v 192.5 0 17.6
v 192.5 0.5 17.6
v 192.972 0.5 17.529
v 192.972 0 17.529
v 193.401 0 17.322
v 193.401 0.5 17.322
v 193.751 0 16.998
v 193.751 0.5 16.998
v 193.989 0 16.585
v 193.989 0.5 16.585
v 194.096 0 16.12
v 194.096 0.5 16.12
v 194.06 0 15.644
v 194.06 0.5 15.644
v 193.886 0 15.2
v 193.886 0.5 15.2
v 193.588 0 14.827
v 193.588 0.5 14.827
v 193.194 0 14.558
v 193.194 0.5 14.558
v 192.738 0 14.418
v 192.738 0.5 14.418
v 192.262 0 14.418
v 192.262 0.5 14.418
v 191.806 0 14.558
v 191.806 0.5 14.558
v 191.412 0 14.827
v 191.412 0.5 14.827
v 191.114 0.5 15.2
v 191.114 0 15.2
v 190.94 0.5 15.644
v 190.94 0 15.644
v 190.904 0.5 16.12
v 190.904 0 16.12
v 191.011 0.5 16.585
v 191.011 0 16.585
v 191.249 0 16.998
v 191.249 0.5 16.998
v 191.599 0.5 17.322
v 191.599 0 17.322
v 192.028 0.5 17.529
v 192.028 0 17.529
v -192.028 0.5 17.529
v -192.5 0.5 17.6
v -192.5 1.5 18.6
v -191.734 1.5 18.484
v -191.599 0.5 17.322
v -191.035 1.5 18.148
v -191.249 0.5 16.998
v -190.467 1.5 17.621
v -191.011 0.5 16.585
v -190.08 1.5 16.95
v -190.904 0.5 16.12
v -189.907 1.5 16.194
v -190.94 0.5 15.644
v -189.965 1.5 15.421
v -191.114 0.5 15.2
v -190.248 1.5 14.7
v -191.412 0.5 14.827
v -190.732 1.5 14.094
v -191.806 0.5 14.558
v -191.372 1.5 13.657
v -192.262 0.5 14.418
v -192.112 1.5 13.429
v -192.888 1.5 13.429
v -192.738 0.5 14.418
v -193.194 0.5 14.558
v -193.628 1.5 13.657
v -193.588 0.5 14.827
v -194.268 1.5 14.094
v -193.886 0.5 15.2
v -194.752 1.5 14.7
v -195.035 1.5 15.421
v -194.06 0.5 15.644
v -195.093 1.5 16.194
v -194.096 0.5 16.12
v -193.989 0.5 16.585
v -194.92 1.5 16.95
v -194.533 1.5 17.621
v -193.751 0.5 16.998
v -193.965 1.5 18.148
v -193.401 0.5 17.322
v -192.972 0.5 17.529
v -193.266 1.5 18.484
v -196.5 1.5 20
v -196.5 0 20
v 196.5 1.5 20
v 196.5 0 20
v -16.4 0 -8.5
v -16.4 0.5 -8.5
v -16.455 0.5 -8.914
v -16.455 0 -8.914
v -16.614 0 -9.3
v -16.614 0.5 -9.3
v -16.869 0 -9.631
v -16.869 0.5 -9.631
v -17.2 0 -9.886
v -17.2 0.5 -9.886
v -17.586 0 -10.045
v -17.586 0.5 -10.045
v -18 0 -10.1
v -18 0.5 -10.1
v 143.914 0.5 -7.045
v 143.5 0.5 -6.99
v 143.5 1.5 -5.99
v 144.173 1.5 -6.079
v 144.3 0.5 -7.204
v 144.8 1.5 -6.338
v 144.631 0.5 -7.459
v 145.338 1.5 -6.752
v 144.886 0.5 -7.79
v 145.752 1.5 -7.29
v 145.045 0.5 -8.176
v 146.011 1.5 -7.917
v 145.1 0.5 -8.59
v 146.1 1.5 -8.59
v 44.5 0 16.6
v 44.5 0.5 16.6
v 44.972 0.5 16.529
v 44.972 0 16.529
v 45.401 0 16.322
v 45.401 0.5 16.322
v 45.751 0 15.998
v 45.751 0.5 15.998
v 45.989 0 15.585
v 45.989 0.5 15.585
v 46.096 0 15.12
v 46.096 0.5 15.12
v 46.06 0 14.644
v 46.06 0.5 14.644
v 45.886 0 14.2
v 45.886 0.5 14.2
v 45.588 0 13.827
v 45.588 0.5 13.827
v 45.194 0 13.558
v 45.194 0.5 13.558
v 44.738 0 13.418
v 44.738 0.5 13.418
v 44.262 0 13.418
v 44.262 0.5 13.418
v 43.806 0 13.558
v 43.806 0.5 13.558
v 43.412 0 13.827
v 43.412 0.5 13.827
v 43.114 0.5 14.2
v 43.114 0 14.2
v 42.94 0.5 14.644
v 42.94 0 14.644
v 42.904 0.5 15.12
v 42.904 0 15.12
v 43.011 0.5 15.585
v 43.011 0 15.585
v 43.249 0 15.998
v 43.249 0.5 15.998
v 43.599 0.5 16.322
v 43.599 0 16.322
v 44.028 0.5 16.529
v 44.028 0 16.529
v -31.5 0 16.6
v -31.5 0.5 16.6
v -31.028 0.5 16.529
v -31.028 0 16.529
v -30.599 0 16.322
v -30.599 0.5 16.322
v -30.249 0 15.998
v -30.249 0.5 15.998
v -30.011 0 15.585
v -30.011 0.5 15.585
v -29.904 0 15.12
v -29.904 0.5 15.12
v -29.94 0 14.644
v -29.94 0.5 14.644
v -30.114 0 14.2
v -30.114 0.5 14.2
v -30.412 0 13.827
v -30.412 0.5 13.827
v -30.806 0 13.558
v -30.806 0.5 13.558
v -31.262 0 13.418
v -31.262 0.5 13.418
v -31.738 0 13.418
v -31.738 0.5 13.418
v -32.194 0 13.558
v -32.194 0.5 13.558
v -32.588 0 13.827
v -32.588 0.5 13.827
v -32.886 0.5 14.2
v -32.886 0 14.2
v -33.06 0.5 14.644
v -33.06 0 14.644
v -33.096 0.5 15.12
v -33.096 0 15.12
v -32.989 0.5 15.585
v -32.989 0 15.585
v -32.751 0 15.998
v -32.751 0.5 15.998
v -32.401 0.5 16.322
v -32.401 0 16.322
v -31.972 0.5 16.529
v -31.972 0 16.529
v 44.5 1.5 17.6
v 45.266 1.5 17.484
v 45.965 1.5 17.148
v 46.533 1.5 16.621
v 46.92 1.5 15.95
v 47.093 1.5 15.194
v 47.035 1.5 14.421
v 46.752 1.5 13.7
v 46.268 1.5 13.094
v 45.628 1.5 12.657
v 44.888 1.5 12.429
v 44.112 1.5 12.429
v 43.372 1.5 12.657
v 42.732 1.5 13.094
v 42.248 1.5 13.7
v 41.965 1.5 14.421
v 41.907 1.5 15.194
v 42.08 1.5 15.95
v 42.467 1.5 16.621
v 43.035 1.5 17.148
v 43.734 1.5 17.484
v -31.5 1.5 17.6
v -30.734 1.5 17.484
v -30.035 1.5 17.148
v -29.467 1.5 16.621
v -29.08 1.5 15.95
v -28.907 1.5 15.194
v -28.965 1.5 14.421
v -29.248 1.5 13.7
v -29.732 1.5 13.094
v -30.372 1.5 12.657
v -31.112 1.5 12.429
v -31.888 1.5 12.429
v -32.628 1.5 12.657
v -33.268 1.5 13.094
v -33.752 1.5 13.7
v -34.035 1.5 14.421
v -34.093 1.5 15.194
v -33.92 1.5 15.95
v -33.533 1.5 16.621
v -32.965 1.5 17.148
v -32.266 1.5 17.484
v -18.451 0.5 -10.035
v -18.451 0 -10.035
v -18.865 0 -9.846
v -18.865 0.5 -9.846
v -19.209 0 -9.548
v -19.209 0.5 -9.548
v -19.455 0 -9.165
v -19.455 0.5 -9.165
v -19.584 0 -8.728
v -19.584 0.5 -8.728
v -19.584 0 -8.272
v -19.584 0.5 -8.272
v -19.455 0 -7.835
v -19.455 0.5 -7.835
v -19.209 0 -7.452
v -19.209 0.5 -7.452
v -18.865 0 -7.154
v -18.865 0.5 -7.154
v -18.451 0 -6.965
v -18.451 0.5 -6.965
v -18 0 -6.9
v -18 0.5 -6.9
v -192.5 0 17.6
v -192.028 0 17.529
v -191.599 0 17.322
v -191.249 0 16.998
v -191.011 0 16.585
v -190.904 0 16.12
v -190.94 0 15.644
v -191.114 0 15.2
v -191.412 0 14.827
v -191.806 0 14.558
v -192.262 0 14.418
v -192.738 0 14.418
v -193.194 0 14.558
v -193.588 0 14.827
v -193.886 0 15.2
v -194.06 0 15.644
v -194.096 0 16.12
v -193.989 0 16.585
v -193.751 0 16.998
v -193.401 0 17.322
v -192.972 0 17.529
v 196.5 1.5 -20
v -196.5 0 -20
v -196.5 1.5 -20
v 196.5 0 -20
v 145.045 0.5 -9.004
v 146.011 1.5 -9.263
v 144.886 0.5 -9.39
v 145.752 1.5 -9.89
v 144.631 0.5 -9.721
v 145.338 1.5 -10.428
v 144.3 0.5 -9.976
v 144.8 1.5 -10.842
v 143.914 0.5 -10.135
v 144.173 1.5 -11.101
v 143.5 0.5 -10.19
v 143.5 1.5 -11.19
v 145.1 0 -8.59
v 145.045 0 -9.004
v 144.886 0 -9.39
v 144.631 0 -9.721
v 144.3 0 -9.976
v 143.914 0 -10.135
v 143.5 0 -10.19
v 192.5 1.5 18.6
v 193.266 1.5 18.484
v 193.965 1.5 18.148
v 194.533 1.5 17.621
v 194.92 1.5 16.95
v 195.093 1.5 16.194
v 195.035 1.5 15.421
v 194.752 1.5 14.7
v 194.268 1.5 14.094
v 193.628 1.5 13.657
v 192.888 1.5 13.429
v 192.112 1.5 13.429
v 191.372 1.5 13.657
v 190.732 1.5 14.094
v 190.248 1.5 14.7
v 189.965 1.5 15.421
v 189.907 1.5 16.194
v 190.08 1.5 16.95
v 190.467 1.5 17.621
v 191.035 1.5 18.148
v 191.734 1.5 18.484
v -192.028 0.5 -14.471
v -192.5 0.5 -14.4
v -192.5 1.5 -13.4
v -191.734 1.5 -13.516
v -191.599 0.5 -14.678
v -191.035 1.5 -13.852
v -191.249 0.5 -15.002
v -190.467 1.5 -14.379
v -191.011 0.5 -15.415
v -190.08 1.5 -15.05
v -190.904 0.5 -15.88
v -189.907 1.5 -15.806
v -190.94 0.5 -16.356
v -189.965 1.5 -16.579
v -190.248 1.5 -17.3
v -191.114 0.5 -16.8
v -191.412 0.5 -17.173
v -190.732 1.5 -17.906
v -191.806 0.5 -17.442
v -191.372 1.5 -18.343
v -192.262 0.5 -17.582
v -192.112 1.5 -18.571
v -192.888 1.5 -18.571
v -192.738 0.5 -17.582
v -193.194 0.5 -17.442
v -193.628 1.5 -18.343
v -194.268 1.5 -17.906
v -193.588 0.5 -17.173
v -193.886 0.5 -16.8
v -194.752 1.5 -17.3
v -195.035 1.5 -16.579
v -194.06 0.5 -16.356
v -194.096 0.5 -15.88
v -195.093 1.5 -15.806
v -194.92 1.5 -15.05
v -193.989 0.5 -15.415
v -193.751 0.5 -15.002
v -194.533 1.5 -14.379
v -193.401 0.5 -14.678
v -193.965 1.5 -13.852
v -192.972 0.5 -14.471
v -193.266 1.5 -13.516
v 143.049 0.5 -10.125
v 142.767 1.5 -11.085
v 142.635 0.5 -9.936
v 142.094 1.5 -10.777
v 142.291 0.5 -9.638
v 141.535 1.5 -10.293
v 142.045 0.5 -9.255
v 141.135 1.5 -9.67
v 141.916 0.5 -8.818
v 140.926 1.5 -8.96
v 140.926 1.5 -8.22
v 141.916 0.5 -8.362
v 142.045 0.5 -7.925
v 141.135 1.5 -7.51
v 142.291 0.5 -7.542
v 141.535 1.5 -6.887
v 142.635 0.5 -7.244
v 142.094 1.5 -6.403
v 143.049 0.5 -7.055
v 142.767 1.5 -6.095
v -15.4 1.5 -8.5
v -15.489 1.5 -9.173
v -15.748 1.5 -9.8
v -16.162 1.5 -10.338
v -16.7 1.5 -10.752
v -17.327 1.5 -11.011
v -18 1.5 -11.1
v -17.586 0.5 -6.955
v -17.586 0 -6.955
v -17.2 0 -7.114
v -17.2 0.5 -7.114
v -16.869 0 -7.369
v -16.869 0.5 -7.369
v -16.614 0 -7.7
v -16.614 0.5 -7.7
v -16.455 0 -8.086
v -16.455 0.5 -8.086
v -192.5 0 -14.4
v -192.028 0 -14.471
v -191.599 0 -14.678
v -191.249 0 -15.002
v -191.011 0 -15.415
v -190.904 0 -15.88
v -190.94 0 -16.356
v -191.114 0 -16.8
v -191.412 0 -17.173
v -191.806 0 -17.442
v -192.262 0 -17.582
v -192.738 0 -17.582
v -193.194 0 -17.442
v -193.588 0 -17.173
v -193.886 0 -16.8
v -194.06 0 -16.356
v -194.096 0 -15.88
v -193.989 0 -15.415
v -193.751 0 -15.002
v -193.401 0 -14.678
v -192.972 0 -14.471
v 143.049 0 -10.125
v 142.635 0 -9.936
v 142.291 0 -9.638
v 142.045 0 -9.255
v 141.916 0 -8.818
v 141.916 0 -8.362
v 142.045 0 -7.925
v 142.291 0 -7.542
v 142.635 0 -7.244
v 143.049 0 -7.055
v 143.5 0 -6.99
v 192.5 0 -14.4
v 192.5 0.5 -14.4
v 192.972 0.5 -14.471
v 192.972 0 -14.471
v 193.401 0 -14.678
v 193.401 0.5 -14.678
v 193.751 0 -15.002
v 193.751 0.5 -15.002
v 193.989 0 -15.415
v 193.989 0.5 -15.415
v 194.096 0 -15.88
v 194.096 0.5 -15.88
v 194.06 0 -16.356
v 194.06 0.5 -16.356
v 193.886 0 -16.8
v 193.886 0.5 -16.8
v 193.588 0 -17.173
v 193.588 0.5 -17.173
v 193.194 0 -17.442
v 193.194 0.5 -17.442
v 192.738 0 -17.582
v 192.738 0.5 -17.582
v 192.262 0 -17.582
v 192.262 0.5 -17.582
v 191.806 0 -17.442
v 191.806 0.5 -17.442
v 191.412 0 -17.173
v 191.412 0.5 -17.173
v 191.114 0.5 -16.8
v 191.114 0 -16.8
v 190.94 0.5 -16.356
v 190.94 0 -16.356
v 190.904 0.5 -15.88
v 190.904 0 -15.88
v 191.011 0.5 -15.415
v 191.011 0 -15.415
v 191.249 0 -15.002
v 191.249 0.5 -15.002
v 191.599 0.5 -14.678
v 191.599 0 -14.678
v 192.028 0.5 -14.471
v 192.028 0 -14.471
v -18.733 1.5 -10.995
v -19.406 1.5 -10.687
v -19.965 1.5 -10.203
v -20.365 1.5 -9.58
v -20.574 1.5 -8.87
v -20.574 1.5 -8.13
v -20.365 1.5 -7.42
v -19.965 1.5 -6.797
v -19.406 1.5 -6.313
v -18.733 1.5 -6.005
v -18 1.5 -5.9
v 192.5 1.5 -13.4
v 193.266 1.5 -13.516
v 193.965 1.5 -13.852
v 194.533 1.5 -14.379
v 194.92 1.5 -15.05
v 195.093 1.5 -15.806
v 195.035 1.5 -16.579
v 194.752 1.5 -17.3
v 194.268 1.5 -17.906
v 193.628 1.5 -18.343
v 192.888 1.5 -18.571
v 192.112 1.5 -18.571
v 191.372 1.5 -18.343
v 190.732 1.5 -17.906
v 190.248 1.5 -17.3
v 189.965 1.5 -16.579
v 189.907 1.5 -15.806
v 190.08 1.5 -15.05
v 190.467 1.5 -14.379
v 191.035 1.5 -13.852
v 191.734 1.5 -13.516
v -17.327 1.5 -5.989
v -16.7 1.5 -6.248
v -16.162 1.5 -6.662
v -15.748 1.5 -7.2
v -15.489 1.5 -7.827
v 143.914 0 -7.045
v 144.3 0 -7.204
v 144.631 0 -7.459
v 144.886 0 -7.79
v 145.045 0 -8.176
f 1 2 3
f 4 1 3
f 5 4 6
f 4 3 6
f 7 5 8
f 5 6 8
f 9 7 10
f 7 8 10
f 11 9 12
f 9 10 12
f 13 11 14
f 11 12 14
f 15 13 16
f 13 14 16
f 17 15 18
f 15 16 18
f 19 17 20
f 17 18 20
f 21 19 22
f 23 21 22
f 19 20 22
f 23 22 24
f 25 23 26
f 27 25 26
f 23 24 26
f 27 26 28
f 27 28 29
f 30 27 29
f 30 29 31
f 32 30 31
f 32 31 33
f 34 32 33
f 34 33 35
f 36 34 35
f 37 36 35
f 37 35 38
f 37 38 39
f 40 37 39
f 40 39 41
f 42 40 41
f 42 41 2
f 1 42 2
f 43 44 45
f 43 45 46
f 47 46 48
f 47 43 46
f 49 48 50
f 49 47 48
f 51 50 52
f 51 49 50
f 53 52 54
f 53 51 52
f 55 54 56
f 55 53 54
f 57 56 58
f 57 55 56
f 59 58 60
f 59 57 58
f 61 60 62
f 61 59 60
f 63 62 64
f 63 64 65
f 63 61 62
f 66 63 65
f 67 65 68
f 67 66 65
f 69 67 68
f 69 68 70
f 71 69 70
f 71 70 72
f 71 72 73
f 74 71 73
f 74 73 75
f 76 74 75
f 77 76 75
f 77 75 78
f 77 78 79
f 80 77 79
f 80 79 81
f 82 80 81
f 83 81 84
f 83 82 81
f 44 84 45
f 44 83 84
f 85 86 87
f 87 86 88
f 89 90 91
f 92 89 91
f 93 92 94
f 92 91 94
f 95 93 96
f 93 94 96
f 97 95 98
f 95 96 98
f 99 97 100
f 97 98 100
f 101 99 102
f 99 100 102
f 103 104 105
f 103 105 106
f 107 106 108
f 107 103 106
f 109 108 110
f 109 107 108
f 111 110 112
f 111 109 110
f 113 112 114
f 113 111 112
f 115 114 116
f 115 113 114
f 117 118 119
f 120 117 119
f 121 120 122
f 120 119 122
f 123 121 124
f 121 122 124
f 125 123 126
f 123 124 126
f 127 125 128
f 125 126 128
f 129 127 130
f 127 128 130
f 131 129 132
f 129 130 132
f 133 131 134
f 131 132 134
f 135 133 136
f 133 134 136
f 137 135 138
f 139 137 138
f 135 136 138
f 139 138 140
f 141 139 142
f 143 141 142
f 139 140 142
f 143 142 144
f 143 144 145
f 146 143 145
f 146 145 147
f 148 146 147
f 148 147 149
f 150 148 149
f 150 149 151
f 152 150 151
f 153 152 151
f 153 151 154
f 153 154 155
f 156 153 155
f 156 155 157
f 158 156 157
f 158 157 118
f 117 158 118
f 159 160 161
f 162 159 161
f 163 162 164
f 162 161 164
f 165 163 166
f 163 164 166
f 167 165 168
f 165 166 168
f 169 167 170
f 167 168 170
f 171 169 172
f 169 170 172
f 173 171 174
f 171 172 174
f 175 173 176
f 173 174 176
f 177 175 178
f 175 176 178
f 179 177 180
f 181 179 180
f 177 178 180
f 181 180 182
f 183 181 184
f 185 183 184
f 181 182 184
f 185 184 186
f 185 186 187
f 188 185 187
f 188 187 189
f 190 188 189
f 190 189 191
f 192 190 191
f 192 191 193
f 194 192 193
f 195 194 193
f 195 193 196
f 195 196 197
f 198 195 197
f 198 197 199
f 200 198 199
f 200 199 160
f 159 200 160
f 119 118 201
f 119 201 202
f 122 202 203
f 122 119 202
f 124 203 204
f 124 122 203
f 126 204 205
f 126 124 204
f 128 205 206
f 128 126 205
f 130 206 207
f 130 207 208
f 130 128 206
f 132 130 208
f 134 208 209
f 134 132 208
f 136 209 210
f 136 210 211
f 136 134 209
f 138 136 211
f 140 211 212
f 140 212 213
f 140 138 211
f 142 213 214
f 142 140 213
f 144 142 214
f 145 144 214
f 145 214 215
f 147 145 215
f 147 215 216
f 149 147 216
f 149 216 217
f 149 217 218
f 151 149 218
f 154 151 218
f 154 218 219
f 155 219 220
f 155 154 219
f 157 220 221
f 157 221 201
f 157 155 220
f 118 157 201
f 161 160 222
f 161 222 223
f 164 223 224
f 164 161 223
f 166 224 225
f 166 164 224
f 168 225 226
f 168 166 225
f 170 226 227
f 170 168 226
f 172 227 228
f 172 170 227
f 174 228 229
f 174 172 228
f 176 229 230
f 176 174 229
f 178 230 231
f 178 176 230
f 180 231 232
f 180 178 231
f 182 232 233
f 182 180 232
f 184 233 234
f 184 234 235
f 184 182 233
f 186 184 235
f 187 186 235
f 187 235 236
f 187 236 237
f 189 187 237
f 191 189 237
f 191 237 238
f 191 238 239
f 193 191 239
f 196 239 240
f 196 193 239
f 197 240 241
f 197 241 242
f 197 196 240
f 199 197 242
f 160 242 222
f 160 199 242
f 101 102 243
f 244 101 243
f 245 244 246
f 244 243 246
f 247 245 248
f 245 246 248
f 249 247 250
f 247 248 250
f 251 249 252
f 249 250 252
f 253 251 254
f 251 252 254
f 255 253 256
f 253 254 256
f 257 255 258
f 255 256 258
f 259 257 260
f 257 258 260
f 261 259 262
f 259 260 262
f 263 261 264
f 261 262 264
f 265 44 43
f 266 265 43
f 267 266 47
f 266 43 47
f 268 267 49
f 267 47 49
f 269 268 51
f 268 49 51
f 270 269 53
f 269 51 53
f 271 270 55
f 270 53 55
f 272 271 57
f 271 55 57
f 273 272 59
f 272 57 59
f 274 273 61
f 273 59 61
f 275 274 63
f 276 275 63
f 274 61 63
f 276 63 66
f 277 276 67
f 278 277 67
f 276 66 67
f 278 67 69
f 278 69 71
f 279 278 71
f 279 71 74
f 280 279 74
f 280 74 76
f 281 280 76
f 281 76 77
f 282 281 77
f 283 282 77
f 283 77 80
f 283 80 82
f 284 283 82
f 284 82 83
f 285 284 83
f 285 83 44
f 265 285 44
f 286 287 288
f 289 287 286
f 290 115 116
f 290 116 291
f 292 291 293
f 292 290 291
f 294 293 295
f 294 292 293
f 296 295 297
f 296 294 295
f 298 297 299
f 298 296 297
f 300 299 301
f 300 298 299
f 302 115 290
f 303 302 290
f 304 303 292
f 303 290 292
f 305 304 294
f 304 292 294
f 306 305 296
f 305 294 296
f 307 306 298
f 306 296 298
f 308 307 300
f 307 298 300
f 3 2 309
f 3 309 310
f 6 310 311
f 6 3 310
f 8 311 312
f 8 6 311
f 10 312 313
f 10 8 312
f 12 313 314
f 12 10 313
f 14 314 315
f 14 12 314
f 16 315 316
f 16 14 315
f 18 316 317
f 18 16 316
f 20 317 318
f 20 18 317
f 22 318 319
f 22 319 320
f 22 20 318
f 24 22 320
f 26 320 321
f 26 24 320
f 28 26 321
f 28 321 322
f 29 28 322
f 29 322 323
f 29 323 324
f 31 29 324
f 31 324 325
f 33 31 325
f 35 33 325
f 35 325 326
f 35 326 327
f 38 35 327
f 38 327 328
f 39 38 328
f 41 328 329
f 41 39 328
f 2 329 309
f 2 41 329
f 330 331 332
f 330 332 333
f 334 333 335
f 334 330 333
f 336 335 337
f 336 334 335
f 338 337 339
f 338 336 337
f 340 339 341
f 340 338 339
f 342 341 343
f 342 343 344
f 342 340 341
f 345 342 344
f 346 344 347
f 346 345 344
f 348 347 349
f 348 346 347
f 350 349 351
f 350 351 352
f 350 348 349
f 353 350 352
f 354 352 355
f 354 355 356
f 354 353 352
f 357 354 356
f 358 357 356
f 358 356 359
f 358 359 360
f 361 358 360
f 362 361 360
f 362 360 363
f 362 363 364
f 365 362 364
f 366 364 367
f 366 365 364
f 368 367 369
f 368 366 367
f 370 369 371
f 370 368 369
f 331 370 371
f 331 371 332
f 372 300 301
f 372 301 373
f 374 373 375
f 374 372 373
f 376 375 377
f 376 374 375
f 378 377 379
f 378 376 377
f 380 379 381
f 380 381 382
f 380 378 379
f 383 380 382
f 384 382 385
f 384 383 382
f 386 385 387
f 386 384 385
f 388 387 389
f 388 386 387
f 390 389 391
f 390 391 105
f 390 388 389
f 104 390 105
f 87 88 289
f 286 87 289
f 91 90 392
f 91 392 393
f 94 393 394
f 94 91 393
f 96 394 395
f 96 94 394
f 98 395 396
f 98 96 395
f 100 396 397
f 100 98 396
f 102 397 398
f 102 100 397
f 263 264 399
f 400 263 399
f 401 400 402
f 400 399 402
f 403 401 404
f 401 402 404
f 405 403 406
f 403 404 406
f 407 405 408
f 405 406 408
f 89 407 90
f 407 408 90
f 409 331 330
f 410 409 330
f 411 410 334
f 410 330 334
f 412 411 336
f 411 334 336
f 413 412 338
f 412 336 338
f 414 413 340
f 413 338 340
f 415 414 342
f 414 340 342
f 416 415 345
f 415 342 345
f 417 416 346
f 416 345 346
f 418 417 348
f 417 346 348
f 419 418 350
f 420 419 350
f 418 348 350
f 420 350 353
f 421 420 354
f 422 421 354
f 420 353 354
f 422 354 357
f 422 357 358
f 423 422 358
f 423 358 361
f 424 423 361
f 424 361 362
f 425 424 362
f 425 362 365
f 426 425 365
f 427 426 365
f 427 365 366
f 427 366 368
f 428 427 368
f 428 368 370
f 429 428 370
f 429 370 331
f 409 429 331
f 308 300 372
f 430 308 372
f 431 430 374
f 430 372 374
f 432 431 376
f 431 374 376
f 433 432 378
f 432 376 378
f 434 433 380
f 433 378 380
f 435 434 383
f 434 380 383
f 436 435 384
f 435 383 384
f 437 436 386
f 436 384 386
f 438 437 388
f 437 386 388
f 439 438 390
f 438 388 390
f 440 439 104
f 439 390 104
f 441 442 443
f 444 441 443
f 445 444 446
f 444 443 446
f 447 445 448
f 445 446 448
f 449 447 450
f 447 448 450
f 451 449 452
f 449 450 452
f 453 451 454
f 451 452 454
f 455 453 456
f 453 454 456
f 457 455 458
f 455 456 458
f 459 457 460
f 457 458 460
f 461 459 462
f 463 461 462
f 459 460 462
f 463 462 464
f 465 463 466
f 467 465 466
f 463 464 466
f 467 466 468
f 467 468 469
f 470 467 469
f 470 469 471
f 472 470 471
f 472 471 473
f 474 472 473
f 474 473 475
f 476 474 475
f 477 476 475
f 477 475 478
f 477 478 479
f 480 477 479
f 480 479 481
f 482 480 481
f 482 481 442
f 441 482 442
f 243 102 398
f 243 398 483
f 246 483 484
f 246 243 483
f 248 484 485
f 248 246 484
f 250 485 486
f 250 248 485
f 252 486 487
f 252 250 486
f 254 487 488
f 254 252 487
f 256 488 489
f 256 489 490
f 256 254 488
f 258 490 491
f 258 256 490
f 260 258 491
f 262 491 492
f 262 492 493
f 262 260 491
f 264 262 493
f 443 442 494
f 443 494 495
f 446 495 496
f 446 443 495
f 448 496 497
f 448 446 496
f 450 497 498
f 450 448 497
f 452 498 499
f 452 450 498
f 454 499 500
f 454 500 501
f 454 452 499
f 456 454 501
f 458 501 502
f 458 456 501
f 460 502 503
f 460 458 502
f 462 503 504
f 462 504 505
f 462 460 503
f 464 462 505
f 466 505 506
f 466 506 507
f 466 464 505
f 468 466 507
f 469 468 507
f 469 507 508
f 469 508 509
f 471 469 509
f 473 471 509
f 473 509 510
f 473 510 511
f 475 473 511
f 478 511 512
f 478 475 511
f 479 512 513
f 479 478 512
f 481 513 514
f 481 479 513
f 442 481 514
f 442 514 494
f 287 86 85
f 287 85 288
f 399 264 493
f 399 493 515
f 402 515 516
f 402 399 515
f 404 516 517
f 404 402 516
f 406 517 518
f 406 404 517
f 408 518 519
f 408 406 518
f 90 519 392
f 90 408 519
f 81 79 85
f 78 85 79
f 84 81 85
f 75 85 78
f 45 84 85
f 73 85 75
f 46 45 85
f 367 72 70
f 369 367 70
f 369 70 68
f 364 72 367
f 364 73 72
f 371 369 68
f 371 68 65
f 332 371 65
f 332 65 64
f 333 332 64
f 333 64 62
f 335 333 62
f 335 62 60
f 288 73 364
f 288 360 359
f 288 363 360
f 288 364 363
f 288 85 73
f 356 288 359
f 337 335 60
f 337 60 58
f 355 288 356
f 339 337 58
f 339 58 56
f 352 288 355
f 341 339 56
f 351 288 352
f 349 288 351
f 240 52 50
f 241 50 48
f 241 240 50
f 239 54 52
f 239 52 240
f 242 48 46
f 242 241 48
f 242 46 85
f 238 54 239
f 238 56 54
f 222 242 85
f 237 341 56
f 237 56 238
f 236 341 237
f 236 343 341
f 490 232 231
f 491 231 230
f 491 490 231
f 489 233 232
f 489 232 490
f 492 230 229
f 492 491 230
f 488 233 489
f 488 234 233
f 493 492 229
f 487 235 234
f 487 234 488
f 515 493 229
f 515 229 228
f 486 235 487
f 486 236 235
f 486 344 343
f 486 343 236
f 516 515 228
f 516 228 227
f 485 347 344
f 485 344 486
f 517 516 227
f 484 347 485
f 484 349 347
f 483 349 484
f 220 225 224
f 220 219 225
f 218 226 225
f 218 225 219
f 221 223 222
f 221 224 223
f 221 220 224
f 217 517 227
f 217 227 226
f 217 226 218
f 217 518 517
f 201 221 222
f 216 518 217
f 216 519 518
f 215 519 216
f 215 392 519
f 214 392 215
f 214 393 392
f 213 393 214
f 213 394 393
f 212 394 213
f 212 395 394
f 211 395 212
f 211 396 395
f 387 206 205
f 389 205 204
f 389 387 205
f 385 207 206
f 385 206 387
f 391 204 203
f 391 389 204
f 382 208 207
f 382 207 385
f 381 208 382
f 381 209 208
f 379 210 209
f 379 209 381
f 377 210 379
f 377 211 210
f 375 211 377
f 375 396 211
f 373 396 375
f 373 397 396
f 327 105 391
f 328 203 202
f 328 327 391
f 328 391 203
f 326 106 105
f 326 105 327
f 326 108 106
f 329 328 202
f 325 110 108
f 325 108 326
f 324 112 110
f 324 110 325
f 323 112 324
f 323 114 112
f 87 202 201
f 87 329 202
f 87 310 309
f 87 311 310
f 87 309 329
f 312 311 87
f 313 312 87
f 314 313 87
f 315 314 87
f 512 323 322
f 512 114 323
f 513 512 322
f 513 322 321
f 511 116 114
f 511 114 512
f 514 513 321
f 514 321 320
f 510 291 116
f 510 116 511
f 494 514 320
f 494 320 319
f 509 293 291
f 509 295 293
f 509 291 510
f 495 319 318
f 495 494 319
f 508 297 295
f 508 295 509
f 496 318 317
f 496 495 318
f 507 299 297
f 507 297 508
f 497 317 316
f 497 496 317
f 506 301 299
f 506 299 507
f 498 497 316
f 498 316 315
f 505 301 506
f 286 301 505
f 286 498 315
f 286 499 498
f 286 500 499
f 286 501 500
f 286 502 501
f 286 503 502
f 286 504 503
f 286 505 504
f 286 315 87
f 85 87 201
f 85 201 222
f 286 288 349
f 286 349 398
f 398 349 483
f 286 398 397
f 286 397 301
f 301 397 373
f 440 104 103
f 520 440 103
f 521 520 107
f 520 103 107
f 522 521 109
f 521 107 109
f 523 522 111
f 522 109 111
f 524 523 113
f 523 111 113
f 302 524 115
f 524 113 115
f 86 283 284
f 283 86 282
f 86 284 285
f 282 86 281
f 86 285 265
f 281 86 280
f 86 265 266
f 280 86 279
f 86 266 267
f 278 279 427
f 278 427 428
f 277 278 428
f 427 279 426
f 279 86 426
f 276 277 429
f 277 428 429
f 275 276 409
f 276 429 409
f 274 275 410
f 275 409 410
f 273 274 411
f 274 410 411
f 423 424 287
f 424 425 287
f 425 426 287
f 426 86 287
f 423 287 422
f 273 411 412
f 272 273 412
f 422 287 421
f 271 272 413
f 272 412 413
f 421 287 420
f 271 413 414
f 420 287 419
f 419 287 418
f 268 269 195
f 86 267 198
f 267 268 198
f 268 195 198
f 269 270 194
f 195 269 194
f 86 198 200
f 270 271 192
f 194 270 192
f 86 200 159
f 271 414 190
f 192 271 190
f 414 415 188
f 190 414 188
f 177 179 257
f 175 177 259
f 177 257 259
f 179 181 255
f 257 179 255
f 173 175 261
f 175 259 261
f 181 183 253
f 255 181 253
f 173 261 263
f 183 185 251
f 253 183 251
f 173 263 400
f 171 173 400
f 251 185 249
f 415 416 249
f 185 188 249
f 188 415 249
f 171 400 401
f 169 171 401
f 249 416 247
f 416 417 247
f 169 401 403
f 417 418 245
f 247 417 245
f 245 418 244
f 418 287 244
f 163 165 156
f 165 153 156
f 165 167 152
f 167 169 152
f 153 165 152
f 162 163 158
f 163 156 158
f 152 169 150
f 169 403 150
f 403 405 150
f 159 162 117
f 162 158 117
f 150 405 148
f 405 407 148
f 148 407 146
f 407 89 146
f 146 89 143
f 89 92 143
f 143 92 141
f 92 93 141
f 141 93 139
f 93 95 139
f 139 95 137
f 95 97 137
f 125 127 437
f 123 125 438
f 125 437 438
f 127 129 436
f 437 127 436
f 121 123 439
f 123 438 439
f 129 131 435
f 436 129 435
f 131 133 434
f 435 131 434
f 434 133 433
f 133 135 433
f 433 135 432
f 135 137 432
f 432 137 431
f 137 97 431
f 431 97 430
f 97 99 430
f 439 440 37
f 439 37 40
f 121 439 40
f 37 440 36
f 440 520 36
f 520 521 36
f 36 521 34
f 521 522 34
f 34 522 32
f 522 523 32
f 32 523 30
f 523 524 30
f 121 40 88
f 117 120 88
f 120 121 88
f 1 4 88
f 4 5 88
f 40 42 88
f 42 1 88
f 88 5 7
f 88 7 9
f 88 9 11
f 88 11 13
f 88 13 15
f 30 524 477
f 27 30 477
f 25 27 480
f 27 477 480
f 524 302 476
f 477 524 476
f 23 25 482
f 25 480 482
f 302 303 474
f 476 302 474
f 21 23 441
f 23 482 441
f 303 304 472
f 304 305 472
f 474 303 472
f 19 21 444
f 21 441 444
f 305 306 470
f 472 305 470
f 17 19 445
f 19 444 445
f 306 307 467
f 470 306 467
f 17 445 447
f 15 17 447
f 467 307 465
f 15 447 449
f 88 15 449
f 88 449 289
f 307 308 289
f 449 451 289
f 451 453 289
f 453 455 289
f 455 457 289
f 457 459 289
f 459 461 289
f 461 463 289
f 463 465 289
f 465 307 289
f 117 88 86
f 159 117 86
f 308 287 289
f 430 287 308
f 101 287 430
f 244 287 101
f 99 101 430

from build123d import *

# Parameters (mm, degrees)
SKIZZE1_W                       = 393
SKIZZE1_H                       = 40
AUFSATZ_LINEAR_AUSTRAGEN1_DEPTH = 1.5
SKIZZE2_R                       = 1.6
SCHNITT_LINEAR_AUSTRAGEN1_DEPTH = 198.520884972
FASE1_SIZE                      = 1


with BuildPart() as part:
    # Skizze1 → Aufsatz-Linear austragen1 (new body)
    with BuildSketch(Plane(origin=(0, 0, 0), x_dir=(1, 0, 0), z_dir=(0, 1, 0))):
        Rectangle(SKIZZE1_W, SKIZZE1_H)
    extrude(amount=AUFSATZ_LINEAR_AUSTRAGEN1_DEPTH)

    # Skizze2 → Schnitt-Linear austragen1 (cut, through all)
    with BuildSketch(Plane(origin=(0, 1.5, 0), x_dir=(1, 0, 0), z_dir=(0, 1, 0))):
        with Locations(Location((-192.5, 16, 0), (0, 0, 270))):
            Circle(SKIZZE2_R)
        with Locations(Location((-192.5, -16, 0), (0, 0, 270))):
            Circle(SKIZZE2_R)
        with Locations(Location((192.5, -16, 0), (0, 0, 270))):
            Circle(SKIZZE2_R)
        with Locations(Location((192.5, 16, 0), (0, 0, 270))):
            Circle(SKIZZE2_R)
        with Locations(Location((44.5, -15, 0), (0, 0, 270))):
            Circle(SKIZZE2_R)
        with BuildLine():
            ThreePointArc((-16.400011, 8.5), (-16.86864015, 9.63137085), (-18.000011, 10.1))
            Line((-18.000011, 10.1), (-18.000011, 6.9))
            ThreePointArc((-18.000011, 6.9), (-16.86864015, 7.36862915), (-16.400011, 8.5))
        make_face()
        with BuildLine():
            Line((-18.000011, 6.9), (-18.000011, 10.1))
            ThreePointArc((-18.000011, 10.1), (-19.600011, 8.5), (-18.000011, 6.9))
        make_face()
        with BuildLine():
            ThreePointArc((145.099964038, 8.589999773), (144.631340773, 9.721364737), (143.499980683, 10.189999773))
            Line((143.499980683, 10.189999773), (143.499947392, 6.989999773))
            ThreePointArc((143.499947392, 6.989999773), (144.631329002, 7.458623038), (145.099964038, 8.589999773))
        make_face()
        with BuildLine():
            Line((143.499947392, 6.989999773), (143.499980683, 10.189999773))
            ThreePointArc((143.499980683, 10.189999773), (141.899964038, 8.590016418), (143.499947392, 6.989999773))
        make_face()
        with Locations(Location((-31.5, -15, 0), (0, 0, 270))):
            Circle(SKIZZE2_R)
    extrude(amount=-SCHNITT_LINEAR_AUSTRAGEN1_DEPTH, mode=Mode.SUBTRACT)

    # Fase1
    fase1_edges = [part.edges().sort_by_distance(p)[0] for p in [
        (44.5, 1.5, 13.4),
        (192.5, 1.5, -17.6),
        (192.5, 1.5, 14.4),
        (-192.5, 1.5, 14.4),
        (-18.000011, 1.5, -10.1),
        (143.499947392, 1.5, -6.989999773),
        (-31.5, 1.5, 13.4),
        (-192.5, 1.5, -17.6),
    ]]
    chamfer(fase1_edges, length=FASE1_SIZE)


solid = part.part
